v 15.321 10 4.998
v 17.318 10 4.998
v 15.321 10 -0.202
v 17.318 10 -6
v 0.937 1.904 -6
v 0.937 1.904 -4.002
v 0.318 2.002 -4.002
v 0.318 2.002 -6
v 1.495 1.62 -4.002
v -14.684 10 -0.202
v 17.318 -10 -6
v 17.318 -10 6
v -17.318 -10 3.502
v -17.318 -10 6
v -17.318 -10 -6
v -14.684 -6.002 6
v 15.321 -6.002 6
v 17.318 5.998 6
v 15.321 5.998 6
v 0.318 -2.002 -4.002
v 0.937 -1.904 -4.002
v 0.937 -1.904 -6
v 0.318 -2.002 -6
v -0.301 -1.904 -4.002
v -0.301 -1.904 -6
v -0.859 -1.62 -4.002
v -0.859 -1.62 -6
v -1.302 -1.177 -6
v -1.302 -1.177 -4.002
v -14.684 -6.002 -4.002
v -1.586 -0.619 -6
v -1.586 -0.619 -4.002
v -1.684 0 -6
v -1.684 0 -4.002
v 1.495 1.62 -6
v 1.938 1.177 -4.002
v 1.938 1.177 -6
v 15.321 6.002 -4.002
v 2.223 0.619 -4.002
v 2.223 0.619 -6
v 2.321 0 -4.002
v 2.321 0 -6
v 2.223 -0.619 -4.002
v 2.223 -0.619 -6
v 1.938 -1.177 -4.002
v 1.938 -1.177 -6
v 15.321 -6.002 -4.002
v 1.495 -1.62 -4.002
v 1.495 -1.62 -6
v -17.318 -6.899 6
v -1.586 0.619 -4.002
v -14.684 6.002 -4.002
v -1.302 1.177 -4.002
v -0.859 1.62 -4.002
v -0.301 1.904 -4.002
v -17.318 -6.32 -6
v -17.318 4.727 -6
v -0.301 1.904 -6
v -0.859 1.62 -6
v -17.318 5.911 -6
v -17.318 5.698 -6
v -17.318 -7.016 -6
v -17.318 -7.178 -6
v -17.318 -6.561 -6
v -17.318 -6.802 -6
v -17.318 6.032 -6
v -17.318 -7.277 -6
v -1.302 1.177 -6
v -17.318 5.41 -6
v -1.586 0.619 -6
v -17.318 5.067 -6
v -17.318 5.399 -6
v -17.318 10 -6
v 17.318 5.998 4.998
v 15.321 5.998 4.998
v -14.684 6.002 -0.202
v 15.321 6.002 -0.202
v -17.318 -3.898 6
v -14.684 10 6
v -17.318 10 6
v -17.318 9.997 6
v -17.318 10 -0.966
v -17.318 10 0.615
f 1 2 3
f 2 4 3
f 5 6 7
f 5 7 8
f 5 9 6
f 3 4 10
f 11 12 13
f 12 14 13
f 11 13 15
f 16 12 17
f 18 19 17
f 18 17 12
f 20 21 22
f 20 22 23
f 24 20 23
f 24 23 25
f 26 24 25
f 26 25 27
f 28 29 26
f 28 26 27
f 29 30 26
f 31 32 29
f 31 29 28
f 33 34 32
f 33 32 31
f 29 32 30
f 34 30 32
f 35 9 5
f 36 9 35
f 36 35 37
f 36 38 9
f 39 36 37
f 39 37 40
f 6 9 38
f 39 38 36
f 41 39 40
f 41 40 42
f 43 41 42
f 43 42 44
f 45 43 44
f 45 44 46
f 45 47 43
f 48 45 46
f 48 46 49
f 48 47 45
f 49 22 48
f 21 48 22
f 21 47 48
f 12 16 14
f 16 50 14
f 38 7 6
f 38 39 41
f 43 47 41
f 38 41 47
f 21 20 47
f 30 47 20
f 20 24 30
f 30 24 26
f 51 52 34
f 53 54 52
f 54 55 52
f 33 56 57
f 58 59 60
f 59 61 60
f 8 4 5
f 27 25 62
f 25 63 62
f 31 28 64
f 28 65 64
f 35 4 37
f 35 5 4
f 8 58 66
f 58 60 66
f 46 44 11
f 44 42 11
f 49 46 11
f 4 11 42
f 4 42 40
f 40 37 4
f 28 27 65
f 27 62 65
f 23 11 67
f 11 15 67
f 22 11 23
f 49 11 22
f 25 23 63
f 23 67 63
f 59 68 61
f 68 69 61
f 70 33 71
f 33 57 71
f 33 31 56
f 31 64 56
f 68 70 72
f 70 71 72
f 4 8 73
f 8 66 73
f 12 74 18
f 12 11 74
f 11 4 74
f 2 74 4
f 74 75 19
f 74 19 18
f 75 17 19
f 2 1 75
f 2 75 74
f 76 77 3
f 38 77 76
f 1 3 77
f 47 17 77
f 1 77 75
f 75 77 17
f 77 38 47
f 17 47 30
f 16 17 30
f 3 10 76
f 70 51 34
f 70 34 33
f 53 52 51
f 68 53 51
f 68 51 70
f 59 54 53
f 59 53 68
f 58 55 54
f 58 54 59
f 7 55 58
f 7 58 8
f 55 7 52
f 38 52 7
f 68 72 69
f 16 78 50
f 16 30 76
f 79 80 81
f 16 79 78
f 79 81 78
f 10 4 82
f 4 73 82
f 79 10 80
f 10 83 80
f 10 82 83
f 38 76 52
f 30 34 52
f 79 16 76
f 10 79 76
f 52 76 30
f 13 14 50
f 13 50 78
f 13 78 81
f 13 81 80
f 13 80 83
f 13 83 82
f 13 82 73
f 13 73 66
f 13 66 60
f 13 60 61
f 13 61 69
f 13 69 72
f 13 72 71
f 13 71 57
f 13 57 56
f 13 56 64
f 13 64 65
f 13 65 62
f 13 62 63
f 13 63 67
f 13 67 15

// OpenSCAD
// Parametric/customizer wrapper for the original hotbed_foot.stl geometry.
// Self-contained: this file does not import or reference the source STL.
// Defaults intentionally match hotbed_foot_v2.scad and the original STL dimensions.
// Wall-strength options add material outside the source shape so inner geometry stays intact.
// The notch-facing side is labeled Notch Front; added material there follows the notch shape.

/* [Foot body] */
// Use Original STL to keep the exact source dimensions.
foot_size_preset = "Original STL"; // [Original STL, Custom]
// Custom left-to-right size; used only when foot_size_preset is Custom.
custom_foot_length = 34.63543701; // [20:0.1:80]
// Custom front-to-back size; used only when foot_size_preset is Custom.
custom_foot_width = 20; // [10:0.1:60]
// Custom bottom-to-top size; used only when foot_size_preset is Custom.
custom_foot_height = 12; // [4:0.1:40]

/* [Large notch opening] */
// Original STL keeps the notch exactly as modeled in the STL.
large_notch_preset = "Original STL"; // [Original STL, Wider, Narrower, Deeper, Shallower, Custom]
// Custom left/right scale for the large notch area; used only when large_notch_preset is Custom.
custom_large_notch_width_scale = 1.00; // [0.5:0.01:1.5]
// Custom front/back scale for the large notch area; used only when large_notch_preset is Custom.
custom_large_notch_depth_scale = 1.00; // [0.5:0.01:1.5]


/* [Wall strength] */
// Original STL adds no extra wall material. Strength presets expand outward only.
wall_strength_preset = "Original STL"; // [Original STL, +1 mm, +2 mm, Custom]
// Custom outward wall expansion; used only when wall_strength_preset is Custom.
custom_wall_expansion = 0.00; // [0:0.1:8]
// Which outside walls get extra material. Notch Front follows the original notch-shaped geometry.
wall_expansion_area = "Sides and Notch Front"; // [Sides and Notch Front, Sides Only, Notch Front Only, All Outside]

/* [Top wall notch] */
// Original Left matches the source STL. Mirrored Right flips the foot so the notch moves to the other side.
top_notch_side = "Original Left"; // [Original Left, Mirrored Right]

/* [Placement] */
// Centered opens visibly at the origin; Source STL places the part at the original STL coordinates.
model_position = "Centered"; // [Centered, Source STL]

orig_length = 34.63543701;
orig_width = 20;
orig_height = 12;
source_center = [149.8822937, 138.25900269, 6];

function resolved_length() = foot_size_preset == "Original STL" ? orig_length : custom_foot_length;
function resolved_width() = foot_size_preset == "Original STL" ? orig_width : custom_foot_width;
function resolved_height() = foot_size_preset == "Original STL" ? orig_height : custom_foot_height;

function large_notch_width_scale() =
  large_notch_preset == "Wider" ? 1.10 :
  large_notch_preset == "Narrower" ? 0.90 :
  large_notch_preset == "Custom" ? custom_large_notch_width_scale :
  1.00;

function large_notch_depth_scale() =
  large_notch_preset == "Deeper" ? 1.10 :
  large_notch_preset == "Shallower" ? 0.90 :
  large_notch_preset == "Custom" ? custom_large_notch_depth_scale :
  1.00;


function wall_expansion_amount() =
  wall_strength_preset == "+1 mm" ? 1.00 :
  wall_strength_preset == "+2 mm" ? 2.00 :
  wall_strength_preset == "Custom" ? custom_wall_expansion :
  0.00;

module outside_wall_reinforcement(length, width, height, expansion, area) {
  overlap = 0.02;
  if (expansion > 0) {
    union() {
      if (area == "Sides and Notch Front" || area == "Sides Only" || area == "All Outside") {
        translate([-length / 2 - expansion, -width / 2, -height / 2])
          cube([expansion + overlap, width, height]);
        translate([length / 2 - overlap, -width / 2, -height / 2])
          cube([expansion + overlap, width, height]);
      }

      // All Outside is the only mode that adds a plain rear wall away from the notch.
      if (area == "All Outside") {
        translate([-length / 2 - expansion, -width / 2 - expansion, -height / 2])
          cube([length + 2 * expansion, expansion + overlap, height]);
      }
    }
  }
}

module notch_front_reinforcement(expansion, notch_side, notch_width_scale_value, notch_depth_scale_value) {
  if (expansion > 0) {
    mirror_for_notch = notch_side == "Mirrored Right" ? [-1, 1, 1] : [1, 1, 1];

    // The notch/front side of this mesh is +Y. A shifted copy thickens that side
    // while preserving the large notch and the smaller top notch cut profiles.
    translate([0, expansion, 0])
      scale(mirror_for_notch)
        scale([notch_width_scale_value, notch_depth_scale_value, 1])
          hotbed_foot_original_mesh_v6();
  }
}
module hotbed_foot_original_mesh_v6() {
  polyhedron(
    points = [
      [15.32070923, 10, 4.9980011],
      [17.31771851, 10, 4.9980011],
      [15.32070923, 10, -0.20199966],
      [17.31771851, 10, -6],
      [0.93670654, 1.9039917, -6],
      [0.93670654, 1.9039917, -4.0019989],
      [0.31771851, 2.0019989, -4.0019989],
      [0.31771851, 2.0019989, -6],
      [1.4947052, 1.61999512, -4.0019989],
      [-14.68429565, 10, -0.20199966],
      [17.31771851, -10, -6],
      [17.31771851, -10, 6],
      [-17.31771851, -10, 3.50236511],
      [-17.31771851, -10, 6],
      [-17.31771851, -10, -6],
      [-14.68429565, -6.0019989, 6],
      [15.32070923, -6.0019989, 6],
      [17.31771851, 5.9980011, 6],
      [15.32070923, 5.9980011, 6],
      [0.31771851, -2.0019989, -4.0019989],
      [0.93670654, -1.90400696, -4.0019989],
      [0.93670654, -1.90400696, -6],
      [0.31771851, -2.0019989, -6],
      [-0.30130005, -1.90400696, -4.0019989],
      [-0.30130005, -1.90400696, -6],
      [-0.85929871, -1.61999512, -4.0019989],
      [-0.85929871, -1.61999512, -6],
      [-1.30229187, -1.17700195, -6],
      [-1.30229187, -1.17700195, -4.0019989],
      [-14.68429565, -6.0019989, -4.0019989],
      [-1.58628845, -0.6190033, -6],
      [-1.58628845, -0.6190033, -4.0019989],
      [-1.68429565, 0, -6],
      [-1.68429565, 0, -4.0019989],
      [1.4947052, 1.61999512, -6],
      [1.93771362, 1.17700195, -4.0019989],
      [1.93771362, 1.17700195, -6],
      [15.32070923, 6.0019989, -4.0019989],
      [2.22271729, 0.61898804, -4.0019989],
      [2.22271729, 0.61898804, -6],
      [2.32070923, 0, -4.0019989],
      [2.32070923, 0, -6],
      [2.22271729, -0.6190033, -4.0019989],
      [2.22271729, -0.6190033, -6],
      [1.93771362, -1.17700195, -4.0019989],
      [1.93771362, -1.17700195, -6],
      [15.32070923, -6.0019989, -4.0019989],
      [1.4947052, -1.61999512, -4.0019989],
      [1.4947052, -1.61999512, -6],
      [-17.31771851, -6.89901733, 6],
      [-1.58628845, 0.61898804, -4.0019989],
      [-14.68429565, 6.0019989, -4.0019989],
      [-1.30229187, 1.17700195, -4.0019989],
      [-0.85929871, 1.61999512, -4.0019989],
      [-0.30130005, 1.9039917, -4.0019989],
      [-17.31771851, -6.31982422, -6],
      [-17.31771851, 4.72679138, -6],
      [-0.30130005, 1.9039917, -6],
      [-0.85929871, 1.61999512, -6],
      [-17.31771851, 5.91101074, -6],
      [-17.31771851, 5.69773865, -6],
      [-17.31771851, -7.01554871, -6],
      [-17.31771851, -7.17828369, -6],
      [-17.31771851, -6.56124878, -6],
      [-17.31771851, -6.80236816, -6],
      [-17.31771851, 6.03193665, -6],
      [-17.31771851, -7.27697754, -6],
      [-1.30229187, 1.17700195, -6],
      [-17.31771851, 5.41018677, -6],
      [-1.58628845, 0.61898804, -6],
      [-17.31771851, 5.06710815, -6],
      [-17.31771851, 5.39915466, -6],
      [-17.31771851, 10, -6],
      [17.31771851, 5.9980011, 4.9980011],
      [15.32070923, 5.9980011, 4.9980011],
      [-14.68429565, 6.0019989, -0.20199966],
      [15.32070923, 6.0019989, -0.20199966],
      [-17.31771851, -3.89782715, 6],
      [-14.68429565, 10, 6],
      [-17.31771851, 10, 6],
      [-17.31771851, 9.9969635, 6],
      [-17.31771851, 10, -0.96550751],
      [-17.31771851, 10, 0.61470413],
    ],
    faces = [
      [2, 1, 0],
      [2, 3, 1],
      [6, 5, 4],
      [7, 6, 4],
      [5, 8, 4],
      [9, 3, 2],
      [12, 11, 10],
      [12, 13, 11],
      [14, 12, 10],
      [16, 11, 15],
      [16, 18, 17],
      [11, 16, 17],
      [21, 20, 19],
      [22, 21, 19],
      [22, 19, 23],
      [24, 22, 23],
      [24, 23, 25],
      [26, 24, 25],
      [25, 28, 27],
      [26, 25, 27],
      [25, 29, 28],
      [28, 31, 30],
      [27, 28, 30],
      [31, 33, 32],
      [30, 31, 32],
      [29, 31, 28],
      [31, 29, 33],
      [4, 8, 34],
      [34, 8, 35],
      [36, 34, 35],
      [8, 37, 35],
      [36, 35, 38],
      [39, 36, 38],
      [37, 8, 5],
      [35, 37, 38],
      [39, 38, 40],
      [41, 39, 40],
      [41, 40, 42],
      [43, 41, 42],
      [43, 42, 44],
      [45, 43, 44],
      [42, 46, 44],
      [45, 44, 47],
      [48, 45, 47],
      [44, 46, 47],
      [47, 21, 48],
      [21, 47, 20],
      [47, 46, 20],
      [13, 15, 11],
      [13, 49, 15],
      [5, 6, 37],
      [40, 38, 37],
      [40, 46, 42],
      [46, 40, 37],
      [46, 19, 20],
      [19, 46, 29],
      [29, 23, 19],
      [25, 23, 29],
      [33, 51, 50],
      [51, 53, 52],
      [51, 54, 53],
      [56, 55, 32],
      [59, 58, 57],
      [59, 60, 58],
      [4, 3, 7],
      [61, 24, 26],
      [61, 62, 24],
      [63, 27, 30],
      [63, 64, 27],
      [36, 3, 34],
      [3, 4, 34],
      [65, 57, 7],
      [65, 59, 57],
      [10, 43, 45],
      [10, 41, 43],
      [10, 45, 48],
      [41, 10, 3],
      [39, 41, 3],
      [3, 36, 39],
      [64, 26, 27],
      [64, 61, 26],
      [66, 10, 22],
      [66, 14, 10],
      [22, 10, 21],
      [21, 10, 48],
      [62, 22, 24],
      [62, 66, 22],
      [60, 67, 58],
      [60, 68, 67],
      [70, 32, 69],
      [70, 56, 32],
      [55, 30, 32],
      [55, 63, 30],
      [71, 69, 67],
      [71, 70, 69],
      [72, 7, 3],
      [72, 65, 7],
      [17, 73, 11],
      [73, 10, 11],
      [73, 3, 10],
      [3, 73, 1],
      [18, 74, 73],
      [17, 18, 73],
      [18, 16, 74],
      [74, 0, 1],
      [73, 74, 1],
      [2, 76, 75],
      [75, 76, 37],
      [76, 2, 0],
      [76, 16, 46],
      [74, 76, 0],
      [16, 76, 74],
      [46, 37, 76],
      [29, 46, 16],
      [29, 16, 15],
      [75, 9, 2],
      [33, 50, 69],
      [32, 33, 69],
      [50, 51, 52],
      [50, 52, 67],
      [69, 50, 67],
      [52, 53, 58],
      [67, 52, 58],
      [53, 54, 57],
      [58, 53, 57],
      [57, 54, 6],
      [7, 57, 6],
      [51, 6, 54],
      [6, 51, 37],
      [68, 71, 67],
      [49, 77, 15],
      [75, 29, 15],
      [80, 79, 78],
      [77, 78, 15],
      [77, 80, 78],
      [81, 3, 9],
      [81, 72, 3],
      [79, 9, 78],
      [79, 82, 9],
      [82, 81, 9],
      [51, 75, 37],
      [51, 33, 29],
      [75, 15, 78],
      [75, 78, 9],
      [29, 75, 51],
      [49, 13, 12],
      [77, 49, 12],
      [80, 77, 12],
      [79, 80, 12],
      [82, 79, 12],
      [81, 82, 12],
      [72, 81, 12],
      [65, 72, 12],
      [59, 65, 12],
      [60, 59, 12],
      [68, 60, 12],
      [71, 68, 12],
      [70, 71, 12],
      [56, 70, 12],
      [55, 56, 12],
      [63, 55, 12],
      [64, 63, 12],
      [61, 64, 12],
      [62, 61, 12],
      [66, 62, 12],
      [14, 66, 12],
    ],
    convexity = 10
  );
}

module hotbed_foot_v6(
  position = model_position,
  notch_side = top_notch_side
) {
  placement = position == "Source STL" ? source_center : [0, 0, 0];
  body_scale = [resolved_length() / orig_length, resolved_width() / orig_width, resolved_height() / orig_height];
  notch_scale = [large_notch_width_scale(), large_notch_depth_scale(), 1];
  mirror_for_notch = notch_side == "Mirrored Right" ? [-1, 1, 1] : [1, 1, 1];

  translate(placement)
    scale(body_scale)
      union() {
        scale(mirror_for_notch)
          // The notch-scale control is centered on the original mesh so Original STL remains exact at 1.00.
          scale(notch_scale)
            hotbed_foot_original_mesh_v6();

        // Side/rear reinforcement is outside the original bounding box only.
        outside_wall_reinforcement(orig_length, orig_width, orig_height, wall_expansion_amount(), wall_expansion_area);

        // Notch Front reinforcement follows the source notch shape instead of using a rectangular bar.
        if (wall_expansion_area == "Sides and Notch Front" || wall_expansion_area == "Notch Front Only" || wall_expansion_area == "All Outside")
          notch_front_reinforcement(wall_expansion_amount(), notch_side, large_notch_width_scale(), large_notch_depth_scale());
      }
}

hotbed_foot_v6();
